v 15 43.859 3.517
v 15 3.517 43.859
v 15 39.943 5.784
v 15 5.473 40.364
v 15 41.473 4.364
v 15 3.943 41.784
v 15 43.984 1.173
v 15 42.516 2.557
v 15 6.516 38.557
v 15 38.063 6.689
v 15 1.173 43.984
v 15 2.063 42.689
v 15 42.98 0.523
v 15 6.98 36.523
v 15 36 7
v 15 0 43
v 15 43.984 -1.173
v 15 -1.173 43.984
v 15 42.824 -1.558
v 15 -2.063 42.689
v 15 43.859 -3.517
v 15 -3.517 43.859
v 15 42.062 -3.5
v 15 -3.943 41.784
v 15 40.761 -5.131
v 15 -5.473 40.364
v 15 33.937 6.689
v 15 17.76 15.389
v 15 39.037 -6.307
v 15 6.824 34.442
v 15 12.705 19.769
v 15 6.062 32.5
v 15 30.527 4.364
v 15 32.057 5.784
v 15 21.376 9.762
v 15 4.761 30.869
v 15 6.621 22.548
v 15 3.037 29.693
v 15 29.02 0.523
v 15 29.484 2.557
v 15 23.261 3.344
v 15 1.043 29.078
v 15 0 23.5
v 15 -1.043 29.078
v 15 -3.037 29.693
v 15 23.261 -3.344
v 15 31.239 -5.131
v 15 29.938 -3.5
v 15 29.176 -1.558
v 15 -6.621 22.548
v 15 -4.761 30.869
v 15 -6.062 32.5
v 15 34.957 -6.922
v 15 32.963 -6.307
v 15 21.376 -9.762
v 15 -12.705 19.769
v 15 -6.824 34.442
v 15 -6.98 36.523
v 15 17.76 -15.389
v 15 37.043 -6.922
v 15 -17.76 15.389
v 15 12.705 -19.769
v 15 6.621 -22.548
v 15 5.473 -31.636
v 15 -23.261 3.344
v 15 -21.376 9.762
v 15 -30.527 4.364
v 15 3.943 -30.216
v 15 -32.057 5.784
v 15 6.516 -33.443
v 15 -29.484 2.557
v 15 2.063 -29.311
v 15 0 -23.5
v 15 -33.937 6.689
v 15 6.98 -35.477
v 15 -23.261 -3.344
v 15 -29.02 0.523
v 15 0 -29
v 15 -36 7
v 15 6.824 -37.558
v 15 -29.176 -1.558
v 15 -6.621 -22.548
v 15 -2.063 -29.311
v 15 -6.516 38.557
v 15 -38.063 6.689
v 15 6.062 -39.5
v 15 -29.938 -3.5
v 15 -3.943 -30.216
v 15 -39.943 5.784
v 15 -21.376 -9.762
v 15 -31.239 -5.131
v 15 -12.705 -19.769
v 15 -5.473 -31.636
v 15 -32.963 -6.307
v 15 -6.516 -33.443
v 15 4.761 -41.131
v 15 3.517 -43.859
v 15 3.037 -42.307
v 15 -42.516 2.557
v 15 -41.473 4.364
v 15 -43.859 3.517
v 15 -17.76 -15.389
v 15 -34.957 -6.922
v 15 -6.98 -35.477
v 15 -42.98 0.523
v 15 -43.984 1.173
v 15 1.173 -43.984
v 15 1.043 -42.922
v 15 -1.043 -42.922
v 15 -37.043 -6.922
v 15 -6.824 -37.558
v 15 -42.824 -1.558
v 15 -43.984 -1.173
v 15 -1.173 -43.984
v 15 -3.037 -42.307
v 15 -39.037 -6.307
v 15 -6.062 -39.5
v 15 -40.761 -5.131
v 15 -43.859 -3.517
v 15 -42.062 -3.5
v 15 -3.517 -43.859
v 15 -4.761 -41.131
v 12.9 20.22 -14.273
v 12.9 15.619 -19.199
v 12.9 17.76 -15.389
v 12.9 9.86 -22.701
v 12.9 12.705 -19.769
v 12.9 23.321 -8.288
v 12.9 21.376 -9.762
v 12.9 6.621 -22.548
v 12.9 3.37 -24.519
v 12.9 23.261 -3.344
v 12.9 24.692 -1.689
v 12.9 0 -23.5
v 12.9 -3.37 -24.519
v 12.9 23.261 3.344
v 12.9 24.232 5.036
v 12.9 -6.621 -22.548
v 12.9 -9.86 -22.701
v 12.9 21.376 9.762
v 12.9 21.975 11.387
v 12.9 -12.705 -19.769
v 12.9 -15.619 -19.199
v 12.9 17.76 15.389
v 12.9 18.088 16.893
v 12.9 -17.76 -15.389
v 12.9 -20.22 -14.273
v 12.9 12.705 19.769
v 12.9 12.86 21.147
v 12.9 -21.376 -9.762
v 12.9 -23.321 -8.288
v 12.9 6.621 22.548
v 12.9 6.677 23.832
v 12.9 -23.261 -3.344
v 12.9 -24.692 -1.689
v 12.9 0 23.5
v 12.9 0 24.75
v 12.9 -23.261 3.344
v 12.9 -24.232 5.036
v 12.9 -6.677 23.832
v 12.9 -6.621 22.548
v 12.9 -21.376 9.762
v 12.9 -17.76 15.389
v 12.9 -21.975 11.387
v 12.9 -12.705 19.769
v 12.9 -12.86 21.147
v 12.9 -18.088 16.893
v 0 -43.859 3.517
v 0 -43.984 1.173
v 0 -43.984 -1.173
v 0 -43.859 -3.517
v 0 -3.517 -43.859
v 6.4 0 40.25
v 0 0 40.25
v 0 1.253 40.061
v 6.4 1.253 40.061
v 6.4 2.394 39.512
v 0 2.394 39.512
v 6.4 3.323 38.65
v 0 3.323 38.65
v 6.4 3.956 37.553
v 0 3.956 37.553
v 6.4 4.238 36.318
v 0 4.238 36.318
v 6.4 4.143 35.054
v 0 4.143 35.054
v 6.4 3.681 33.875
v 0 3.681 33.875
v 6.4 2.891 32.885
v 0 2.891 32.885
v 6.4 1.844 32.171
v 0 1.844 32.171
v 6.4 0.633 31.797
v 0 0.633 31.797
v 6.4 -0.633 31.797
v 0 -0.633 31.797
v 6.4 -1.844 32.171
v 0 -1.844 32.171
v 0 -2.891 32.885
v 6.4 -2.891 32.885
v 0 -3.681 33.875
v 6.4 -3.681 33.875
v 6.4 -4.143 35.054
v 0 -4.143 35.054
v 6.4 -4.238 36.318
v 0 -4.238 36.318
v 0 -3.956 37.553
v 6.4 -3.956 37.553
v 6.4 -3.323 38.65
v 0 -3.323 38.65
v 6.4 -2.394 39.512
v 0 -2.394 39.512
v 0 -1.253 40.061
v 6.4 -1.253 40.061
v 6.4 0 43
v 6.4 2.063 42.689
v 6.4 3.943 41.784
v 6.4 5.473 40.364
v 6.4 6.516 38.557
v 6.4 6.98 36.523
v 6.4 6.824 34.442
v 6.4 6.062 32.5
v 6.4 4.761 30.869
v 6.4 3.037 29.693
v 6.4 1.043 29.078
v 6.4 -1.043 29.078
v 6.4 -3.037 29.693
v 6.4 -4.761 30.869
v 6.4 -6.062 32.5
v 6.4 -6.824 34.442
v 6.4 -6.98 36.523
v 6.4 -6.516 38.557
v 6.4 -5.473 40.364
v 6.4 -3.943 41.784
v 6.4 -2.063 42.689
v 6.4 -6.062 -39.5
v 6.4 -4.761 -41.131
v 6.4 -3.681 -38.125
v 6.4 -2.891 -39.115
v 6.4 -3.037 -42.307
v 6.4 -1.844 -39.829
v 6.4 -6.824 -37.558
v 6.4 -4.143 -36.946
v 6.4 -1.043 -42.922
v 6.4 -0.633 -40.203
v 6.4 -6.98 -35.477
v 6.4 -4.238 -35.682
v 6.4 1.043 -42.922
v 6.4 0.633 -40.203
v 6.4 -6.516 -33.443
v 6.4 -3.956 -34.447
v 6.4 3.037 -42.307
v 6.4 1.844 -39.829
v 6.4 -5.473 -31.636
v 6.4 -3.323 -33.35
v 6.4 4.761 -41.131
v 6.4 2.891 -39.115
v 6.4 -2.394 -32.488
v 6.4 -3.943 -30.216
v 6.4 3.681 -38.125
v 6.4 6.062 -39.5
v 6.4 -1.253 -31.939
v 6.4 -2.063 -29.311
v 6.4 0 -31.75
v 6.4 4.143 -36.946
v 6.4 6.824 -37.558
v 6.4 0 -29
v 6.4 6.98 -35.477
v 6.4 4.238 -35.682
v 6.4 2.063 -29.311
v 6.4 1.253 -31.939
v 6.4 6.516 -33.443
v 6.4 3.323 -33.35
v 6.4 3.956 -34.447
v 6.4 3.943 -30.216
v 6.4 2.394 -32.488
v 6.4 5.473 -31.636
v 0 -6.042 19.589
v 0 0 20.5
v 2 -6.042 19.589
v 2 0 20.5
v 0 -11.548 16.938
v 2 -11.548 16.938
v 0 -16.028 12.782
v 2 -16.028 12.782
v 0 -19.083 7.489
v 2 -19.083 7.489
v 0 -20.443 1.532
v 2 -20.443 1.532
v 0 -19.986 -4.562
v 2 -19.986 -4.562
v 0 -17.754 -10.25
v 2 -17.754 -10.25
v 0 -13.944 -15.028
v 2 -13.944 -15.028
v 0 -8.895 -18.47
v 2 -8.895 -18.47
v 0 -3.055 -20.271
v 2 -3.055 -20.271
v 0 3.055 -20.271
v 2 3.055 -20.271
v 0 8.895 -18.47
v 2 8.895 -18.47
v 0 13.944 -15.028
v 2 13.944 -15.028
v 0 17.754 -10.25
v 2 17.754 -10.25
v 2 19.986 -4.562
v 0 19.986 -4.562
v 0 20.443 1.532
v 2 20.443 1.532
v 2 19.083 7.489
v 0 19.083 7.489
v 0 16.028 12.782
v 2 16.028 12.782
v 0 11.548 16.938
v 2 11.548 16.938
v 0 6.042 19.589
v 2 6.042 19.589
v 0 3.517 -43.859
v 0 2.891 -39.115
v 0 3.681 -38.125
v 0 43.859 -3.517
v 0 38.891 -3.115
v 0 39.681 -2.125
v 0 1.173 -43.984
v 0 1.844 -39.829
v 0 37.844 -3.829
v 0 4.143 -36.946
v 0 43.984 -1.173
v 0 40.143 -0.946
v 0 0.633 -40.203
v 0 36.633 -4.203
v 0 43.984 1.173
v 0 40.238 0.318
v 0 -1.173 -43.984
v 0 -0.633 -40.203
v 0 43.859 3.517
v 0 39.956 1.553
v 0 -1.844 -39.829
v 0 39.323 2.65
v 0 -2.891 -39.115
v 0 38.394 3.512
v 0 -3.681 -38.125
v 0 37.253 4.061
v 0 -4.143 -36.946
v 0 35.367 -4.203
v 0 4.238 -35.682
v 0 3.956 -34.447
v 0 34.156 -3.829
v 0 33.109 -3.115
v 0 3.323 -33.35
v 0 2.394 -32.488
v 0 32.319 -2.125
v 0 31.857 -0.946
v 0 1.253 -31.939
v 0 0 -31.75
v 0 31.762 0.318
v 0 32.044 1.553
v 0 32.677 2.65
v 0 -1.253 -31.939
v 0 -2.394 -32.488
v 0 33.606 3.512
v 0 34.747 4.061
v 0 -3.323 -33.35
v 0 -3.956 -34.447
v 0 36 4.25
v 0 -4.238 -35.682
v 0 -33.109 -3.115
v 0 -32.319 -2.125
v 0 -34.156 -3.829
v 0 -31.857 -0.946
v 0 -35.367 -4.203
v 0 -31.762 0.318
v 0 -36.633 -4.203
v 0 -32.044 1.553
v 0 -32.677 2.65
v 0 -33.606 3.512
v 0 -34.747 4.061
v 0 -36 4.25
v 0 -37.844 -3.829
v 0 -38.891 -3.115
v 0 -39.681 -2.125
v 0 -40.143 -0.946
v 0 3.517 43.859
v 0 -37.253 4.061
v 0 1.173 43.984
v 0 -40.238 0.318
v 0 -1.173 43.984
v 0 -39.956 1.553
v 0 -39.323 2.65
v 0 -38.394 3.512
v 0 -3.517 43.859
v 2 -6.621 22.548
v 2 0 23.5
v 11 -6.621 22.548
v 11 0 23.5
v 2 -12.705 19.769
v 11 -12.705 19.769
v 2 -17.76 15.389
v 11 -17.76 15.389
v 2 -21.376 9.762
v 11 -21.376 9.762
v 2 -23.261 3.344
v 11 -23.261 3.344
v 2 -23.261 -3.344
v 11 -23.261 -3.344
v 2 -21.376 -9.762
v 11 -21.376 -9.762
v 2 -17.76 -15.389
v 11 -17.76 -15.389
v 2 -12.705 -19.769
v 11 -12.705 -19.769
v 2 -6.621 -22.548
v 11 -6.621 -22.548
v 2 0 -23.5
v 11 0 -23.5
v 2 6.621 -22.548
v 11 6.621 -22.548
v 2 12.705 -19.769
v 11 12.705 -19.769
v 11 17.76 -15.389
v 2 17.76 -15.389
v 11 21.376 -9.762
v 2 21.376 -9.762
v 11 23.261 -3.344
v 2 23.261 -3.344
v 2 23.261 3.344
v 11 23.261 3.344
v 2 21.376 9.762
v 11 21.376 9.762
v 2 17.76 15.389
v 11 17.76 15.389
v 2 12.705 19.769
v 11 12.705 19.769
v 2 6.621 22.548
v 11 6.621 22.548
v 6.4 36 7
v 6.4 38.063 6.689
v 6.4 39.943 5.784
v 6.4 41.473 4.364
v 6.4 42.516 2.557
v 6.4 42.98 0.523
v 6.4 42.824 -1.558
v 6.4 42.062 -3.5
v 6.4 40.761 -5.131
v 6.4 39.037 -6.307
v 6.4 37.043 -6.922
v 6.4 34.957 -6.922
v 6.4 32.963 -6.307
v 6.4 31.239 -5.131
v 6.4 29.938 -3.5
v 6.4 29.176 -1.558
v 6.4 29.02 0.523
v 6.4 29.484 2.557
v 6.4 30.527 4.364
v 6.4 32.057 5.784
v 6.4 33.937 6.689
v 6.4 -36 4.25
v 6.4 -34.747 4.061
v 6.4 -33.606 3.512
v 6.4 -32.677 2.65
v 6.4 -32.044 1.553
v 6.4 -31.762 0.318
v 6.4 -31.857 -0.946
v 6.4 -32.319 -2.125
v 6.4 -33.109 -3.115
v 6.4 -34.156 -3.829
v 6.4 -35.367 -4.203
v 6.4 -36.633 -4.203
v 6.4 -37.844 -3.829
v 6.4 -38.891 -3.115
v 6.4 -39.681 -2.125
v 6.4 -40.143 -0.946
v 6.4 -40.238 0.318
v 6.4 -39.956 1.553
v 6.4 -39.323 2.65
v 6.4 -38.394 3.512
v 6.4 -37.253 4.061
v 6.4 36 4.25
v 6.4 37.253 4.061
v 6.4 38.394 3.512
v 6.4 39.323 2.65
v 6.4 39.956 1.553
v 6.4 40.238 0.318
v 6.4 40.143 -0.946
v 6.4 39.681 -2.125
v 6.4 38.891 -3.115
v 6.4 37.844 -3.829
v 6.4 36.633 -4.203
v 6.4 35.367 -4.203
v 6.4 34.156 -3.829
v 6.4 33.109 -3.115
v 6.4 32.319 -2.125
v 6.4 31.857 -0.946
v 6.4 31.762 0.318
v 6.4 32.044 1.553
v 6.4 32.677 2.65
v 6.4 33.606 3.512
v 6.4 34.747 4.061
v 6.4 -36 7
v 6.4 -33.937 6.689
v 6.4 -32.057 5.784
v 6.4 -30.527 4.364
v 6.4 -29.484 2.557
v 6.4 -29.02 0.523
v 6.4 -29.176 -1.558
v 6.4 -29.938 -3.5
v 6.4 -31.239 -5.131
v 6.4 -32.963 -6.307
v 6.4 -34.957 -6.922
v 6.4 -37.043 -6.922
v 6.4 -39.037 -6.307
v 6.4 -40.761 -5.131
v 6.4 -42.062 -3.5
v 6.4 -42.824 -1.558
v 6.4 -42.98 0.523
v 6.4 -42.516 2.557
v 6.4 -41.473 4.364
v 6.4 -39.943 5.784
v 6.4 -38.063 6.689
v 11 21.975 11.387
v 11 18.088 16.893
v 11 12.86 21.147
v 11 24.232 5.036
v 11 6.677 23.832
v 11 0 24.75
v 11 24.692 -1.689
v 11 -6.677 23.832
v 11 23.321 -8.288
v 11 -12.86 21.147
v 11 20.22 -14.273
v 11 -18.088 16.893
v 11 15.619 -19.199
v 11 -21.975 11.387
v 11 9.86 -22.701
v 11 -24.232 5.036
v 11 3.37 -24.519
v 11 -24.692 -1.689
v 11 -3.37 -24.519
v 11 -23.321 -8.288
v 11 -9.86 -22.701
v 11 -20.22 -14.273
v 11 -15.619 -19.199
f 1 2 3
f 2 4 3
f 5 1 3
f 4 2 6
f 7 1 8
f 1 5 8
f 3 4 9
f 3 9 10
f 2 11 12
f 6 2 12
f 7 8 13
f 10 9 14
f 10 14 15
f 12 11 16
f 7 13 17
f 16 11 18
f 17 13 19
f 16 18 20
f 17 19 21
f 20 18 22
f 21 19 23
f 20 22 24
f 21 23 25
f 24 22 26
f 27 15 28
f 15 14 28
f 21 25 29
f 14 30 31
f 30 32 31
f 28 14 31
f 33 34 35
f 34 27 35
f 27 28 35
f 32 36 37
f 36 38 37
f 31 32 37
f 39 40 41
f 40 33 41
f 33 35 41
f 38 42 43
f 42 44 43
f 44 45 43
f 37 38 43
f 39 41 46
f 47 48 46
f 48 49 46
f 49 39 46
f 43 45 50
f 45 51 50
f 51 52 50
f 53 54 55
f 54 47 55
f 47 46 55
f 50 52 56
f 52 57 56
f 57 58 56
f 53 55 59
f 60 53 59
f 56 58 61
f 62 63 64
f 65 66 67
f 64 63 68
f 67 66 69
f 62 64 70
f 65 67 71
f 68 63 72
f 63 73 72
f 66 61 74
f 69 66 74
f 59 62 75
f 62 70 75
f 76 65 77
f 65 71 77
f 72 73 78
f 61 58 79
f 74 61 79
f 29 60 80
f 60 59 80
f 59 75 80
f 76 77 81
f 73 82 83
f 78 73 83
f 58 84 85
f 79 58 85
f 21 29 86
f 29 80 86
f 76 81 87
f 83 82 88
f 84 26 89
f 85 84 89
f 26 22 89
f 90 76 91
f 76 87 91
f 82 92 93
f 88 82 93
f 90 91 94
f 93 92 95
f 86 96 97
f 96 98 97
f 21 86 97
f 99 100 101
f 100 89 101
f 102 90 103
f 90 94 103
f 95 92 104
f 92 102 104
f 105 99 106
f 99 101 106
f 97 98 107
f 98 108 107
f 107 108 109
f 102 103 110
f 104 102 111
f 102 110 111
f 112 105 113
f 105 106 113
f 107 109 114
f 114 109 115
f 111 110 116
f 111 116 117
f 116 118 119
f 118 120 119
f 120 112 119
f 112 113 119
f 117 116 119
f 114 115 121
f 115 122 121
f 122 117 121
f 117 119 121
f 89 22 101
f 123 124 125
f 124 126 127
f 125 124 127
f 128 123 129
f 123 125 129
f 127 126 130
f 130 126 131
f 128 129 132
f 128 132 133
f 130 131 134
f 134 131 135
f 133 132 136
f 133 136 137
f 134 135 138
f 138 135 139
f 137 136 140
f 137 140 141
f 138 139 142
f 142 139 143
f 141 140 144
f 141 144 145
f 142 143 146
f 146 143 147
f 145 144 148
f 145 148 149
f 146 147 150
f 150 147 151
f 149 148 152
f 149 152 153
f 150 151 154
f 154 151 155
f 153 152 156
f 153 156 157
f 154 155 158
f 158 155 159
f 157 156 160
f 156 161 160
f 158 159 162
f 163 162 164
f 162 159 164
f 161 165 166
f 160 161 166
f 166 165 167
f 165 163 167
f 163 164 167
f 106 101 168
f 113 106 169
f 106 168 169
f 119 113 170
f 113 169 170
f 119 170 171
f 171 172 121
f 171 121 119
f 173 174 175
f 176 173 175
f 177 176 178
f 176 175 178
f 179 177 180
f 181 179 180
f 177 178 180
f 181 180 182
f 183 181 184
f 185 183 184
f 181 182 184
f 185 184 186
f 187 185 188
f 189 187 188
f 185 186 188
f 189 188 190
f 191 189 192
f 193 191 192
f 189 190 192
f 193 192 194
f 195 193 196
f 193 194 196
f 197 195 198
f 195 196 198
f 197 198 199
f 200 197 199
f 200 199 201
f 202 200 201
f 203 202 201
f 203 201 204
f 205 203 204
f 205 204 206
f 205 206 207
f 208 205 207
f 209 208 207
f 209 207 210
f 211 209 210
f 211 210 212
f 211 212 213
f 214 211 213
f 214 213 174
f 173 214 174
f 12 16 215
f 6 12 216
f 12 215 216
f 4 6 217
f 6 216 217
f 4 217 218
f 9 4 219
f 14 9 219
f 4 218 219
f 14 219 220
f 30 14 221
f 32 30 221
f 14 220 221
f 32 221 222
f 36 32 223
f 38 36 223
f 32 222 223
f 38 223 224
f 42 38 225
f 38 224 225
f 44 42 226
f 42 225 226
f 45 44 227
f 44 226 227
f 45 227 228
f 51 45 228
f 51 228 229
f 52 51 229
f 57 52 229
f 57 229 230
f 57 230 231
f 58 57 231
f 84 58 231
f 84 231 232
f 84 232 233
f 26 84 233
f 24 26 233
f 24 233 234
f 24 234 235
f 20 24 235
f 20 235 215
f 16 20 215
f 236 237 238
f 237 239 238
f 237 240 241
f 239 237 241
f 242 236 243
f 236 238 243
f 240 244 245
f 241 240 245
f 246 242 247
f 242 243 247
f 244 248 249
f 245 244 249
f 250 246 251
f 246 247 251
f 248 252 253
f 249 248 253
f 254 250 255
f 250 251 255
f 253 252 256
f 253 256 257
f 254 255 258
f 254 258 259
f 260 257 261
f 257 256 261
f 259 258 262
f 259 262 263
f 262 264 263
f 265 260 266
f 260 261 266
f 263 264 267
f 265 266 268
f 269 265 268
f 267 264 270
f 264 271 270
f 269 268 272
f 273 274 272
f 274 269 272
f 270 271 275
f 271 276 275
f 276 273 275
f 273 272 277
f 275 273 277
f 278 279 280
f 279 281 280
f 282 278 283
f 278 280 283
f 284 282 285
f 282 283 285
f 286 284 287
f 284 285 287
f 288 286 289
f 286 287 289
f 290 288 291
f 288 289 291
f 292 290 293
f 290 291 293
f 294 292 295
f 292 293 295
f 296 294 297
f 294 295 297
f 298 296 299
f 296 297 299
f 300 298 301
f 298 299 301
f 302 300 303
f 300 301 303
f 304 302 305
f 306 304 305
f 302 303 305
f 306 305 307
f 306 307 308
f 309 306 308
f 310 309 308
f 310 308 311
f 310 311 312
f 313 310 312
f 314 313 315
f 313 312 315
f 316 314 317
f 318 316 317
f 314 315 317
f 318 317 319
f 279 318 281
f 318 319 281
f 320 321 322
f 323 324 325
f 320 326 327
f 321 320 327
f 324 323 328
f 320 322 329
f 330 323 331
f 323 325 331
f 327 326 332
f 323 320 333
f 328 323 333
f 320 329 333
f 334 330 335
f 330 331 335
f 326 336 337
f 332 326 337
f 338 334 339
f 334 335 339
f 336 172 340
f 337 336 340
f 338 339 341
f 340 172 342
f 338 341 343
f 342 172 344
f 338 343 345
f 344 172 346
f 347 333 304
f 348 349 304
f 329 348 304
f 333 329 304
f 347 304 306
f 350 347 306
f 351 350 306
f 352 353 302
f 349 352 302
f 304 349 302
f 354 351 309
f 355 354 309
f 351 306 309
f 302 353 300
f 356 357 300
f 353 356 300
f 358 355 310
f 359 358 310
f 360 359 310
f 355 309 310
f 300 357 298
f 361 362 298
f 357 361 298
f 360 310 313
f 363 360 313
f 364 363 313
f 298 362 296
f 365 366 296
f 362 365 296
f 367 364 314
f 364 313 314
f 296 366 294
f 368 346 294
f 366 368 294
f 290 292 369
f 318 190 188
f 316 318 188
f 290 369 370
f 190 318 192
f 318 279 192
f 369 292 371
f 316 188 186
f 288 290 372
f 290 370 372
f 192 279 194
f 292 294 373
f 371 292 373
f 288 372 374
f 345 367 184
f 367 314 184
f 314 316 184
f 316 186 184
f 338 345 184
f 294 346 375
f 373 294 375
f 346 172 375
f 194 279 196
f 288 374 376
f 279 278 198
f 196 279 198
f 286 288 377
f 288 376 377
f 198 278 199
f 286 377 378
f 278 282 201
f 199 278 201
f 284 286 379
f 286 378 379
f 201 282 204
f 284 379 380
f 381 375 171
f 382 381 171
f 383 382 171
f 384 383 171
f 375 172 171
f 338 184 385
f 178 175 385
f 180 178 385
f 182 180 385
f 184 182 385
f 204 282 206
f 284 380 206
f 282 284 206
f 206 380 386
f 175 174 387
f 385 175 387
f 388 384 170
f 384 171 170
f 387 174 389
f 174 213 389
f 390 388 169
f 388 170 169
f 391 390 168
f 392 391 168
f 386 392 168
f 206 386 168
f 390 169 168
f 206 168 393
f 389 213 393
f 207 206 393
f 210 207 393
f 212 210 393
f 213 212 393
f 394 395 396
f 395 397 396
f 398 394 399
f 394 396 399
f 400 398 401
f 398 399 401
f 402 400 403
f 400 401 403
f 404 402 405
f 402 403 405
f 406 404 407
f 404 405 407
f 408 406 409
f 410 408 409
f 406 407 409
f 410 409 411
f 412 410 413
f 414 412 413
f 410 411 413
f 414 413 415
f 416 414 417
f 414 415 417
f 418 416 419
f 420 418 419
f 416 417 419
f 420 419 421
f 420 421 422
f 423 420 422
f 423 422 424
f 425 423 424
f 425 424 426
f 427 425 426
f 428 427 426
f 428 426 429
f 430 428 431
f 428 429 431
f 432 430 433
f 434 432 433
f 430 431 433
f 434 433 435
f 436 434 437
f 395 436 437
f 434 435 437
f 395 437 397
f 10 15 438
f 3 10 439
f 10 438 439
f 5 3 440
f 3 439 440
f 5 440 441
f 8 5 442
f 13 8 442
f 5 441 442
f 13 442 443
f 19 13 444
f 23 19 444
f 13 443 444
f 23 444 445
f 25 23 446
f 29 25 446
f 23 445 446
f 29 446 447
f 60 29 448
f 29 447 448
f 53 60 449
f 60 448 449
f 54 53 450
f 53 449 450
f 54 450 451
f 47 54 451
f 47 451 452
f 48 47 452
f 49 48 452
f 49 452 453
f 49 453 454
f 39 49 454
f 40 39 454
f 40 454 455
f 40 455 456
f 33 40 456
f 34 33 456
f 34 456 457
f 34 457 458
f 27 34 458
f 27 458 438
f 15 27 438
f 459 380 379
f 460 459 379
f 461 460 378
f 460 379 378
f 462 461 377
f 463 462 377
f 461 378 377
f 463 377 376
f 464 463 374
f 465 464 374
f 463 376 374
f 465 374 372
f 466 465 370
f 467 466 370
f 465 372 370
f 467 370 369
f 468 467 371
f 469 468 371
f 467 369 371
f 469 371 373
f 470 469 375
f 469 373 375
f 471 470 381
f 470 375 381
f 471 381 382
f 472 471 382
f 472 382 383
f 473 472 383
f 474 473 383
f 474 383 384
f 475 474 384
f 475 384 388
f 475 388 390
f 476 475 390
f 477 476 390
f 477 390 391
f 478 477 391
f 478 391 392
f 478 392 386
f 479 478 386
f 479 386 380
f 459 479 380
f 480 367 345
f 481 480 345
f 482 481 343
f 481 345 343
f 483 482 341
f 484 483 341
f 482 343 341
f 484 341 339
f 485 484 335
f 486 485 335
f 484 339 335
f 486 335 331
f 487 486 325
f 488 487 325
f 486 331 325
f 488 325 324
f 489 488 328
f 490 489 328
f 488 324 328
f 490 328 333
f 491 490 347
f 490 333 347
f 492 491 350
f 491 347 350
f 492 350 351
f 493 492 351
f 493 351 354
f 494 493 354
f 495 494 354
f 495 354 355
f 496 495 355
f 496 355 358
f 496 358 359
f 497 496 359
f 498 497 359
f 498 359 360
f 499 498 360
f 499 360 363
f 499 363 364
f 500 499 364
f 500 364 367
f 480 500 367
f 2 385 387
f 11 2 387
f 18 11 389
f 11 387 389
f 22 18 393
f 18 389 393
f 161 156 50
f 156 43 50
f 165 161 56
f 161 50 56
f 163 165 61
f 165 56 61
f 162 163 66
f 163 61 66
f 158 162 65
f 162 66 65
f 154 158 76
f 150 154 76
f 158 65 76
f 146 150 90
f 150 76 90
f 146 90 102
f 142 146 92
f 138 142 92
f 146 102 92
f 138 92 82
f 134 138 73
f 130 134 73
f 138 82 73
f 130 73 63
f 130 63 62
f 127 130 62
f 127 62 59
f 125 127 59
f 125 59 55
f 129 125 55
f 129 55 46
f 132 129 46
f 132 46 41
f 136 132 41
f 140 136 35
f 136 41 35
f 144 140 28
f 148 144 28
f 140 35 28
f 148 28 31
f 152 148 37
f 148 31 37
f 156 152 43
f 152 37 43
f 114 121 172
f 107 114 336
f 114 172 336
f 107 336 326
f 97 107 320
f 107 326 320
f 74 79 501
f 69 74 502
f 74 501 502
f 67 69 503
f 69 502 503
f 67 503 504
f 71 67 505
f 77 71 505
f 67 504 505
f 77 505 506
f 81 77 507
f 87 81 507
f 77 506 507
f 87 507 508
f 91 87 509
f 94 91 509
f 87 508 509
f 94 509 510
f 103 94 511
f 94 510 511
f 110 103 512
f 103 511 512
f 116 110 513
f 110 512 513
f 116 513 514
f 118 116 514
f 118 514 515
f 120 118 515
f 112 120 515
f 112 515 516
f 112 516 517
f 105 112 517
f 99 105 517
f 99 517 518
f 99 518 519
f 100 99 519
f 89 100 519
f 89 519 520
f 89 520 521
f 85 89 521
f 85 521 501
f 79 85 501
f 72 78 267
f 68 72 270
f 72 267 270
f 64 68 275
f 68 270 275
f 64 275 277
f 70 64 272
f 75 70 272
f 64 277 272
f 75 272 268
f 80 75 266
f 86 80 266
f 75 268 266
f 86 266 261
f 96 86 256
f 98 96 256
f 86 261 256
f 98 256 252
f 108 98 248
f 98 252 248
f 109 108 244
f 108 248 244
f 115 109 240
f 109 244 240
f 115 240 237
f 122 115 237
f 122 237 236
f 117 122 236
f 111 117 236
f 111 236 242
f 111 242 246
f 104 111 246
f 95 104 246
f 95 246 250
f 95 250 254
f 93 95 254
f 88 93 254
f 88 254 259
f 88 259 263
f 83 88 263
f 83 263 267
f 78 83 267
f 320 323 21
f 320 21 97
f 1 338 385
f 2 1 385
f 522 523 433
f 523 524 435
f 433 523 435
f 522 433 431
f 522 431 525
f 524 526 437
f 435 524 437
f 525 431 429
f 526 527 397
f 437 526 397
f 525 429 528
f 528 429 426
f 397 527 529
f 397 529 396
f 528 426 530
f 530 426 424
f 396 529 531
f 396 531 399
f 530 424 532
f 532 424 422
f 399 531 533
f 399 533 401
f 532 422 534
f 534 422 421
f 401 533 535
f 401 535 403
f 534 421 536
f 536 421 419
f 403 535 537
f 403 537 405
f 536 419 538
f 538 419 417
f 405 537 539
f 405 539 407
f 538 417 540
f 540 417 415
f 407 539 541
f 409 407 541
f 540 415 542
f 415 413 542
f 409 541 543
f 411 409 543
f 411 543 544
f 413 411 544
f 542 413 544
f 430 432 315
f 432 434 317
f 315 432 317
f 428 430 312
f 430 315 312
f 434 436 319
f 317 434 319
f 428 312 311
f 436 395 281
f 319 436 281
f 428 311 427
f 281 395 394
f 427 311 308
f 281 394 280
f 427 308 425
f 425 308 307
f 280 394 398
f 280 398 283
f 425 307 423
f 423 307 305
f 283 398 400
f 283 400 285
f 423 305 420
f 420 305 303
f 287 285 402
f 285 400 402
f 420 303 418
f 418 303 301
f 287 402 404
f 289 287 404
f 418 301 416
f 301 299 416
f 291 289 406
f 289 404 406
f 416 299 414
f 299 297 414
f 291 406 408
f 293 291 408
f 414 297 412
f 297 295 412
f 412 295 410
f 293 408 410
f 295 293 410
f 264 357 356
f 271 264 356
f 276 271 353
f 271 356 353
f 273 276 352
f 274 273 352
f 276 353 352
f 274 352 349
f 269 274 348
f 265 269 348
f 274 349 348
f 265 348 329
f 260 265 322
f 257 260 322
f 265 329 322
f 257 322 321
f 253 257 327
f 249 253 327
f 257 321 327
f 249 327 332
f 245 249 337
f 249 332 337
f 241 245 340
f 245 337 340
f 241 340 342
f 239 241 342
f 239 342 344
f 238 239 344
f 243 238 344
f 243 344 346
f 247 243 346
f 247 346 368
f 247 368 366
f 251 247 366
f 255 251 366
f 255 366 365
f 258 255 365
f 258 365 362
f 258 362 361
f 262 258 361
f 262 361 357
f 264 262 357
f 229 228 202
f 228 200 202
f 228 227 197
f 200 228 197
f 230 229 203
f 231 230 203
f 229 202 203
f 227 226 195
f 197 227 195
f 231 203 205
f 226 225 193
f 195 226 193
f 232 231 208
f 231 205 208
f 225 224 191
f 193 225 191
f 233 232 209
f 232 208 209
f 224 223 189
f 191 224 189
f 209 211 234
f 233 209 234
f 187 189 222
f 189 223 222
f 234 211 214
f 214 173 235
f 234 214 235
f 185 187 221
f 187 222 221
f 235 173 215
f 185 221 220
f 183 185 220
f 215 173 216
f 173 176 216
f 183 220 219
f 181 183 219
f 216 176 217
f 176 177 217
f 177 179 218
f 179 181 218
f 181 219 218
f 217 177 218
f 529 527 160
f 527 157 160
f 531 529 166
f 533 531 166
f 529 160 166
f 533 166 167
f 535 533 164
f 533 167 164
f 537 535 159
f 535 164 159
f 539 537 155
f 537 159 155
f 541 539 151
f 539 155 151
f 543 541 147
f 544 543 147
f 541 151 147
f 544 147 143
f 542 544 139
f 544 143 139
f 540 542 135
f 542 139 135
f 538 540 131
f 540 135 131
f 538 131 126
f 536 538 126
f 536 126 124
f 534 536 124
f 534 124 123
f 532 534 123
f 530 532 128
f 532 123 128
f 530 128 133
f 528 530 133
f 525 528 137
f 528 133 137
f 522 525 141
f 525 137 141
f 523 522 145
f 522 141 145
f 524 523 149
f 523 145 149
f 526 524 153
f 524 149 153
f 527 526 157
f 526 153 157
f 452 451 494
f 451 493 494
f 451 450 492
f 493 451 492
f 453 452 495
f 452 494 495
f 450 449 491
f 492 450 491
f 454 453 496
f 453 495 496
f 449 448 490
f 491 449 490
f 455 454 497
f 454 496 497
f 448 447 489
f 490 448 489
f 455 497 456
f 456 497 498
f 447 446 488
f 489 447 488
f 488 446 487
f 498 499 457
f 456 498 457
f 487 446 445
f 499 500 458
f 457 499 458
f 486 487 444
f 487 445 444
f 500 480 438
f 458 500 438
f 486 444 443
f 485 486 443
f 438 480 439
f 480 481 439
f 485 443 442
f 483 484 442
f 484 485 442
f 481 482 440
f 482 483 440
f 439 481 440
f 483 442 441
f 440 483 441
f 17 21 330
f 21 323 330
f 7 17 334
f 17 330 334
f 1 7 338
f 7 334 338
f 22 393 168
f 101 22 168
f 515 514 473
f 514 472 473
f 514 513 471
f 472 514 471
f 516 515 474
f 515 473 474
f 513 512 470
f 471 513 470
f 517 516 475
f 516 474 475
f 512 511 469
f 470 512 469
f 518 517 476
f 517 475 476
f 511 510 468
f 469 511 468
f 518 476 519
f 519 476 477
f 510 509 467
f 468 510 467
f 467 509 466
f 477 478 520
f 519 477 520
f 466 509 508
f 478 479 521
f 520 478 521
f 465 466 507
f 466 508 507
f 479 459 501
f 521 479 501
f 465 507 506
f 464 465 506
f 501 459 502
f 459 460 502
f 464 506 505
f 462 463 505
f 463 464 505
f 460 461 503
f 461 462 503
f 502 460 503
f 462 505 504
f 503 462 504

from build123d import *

# Parameters (mm, degrees)
DIAMETER_HOLE1_D     = 14
DIAMETER_HOLE1_DEPTH = 8.6
TAPPED_HOLE1_D       = 8.5
CUT_EXTRUDE1_DEPTH   = 65.007812023


with BuildPart() as part:
    # Sketch1 → Revolve1 (revolve)
    with BuildSketch(Plane.XY):
        Polygon((15, 44), (0, 44), (0, 20.5), (2, 20.5), (2, 23.5), (11, 23.5), (11, 24.75), (12.9, 24.75), (12.9, 23.5), (15, 23.5), align=None)
    revolve(axis=Axis((0, 0, 0), (1, 0, 0)))

    # Diameter Hole1
    with Locations(Plane(origin=(15, 0, 0), x_dir=(0, 0, -1), z_dir=(1, 0, 0))):
        with Locations((0, 36), (36, 0), (0, -36), (-36, 0)):
            Hole(DIAMETER_HOLE1_D / 2, depth=DIAMETER_HOLE1_DEPTH)

    # Tapped Hole1 (through all)
    with Locations(Plane(origin=(6.4, 0, 0), x_dir=(0, 0, -1), z_dir=(1, 0, 0))):
        with Locations((0, 36), (36, 0), (0, -36), (-36, 0)):
            Hole(TAPPED_HOLE1_D / 2)

    # Sketch6 → Cut-Extrude1 (cut, through all)
    with BuildSketch(Plane(origin=(0, 0, 0), x_dir=(0, 0, -1), z_dir=(1, 0, 0))):
        with BuildLine():
            Line((-3.516934416, 43.859219924), (-43.859219924, 3.516934416))
            ThreePointArc((-43.859219924, 3.516934416), (-31.112698372, 31.112698372), (-3.516934416, 43.859219924))
        make_face()
        with BuildLine():
            Line((3.516934416, 43.859219924), (43.859219924, 3.516934416))
            ThreePointArc((43.859219924, 3.516934416), (31.112698372, 31.112698372), (3.516934416, 43.859219924))
        make_face()
        with BuildLine():
            Line((43.859219924, -3.516934416), (3.516934416, -43.859219924))
            ThreePointArc((3.516934416, -43.859219924), (31.112698372, -31.112698372), (43.859219924, -3.516934416))
        make_face()
        with BuildLine():
            Line((-43.859219924, -3.516934416), (-3.516934416, -43.859219924))
            ThreePointArc((-3.516934416, -43.859219924), (-31.112698372, -31.112698372), (-43.859219924, -3.516934416))
        make_face()
    extrude(amount=CUT_EXTRUDE1_DEPTH, mode=Mode.SUBTRACT)


solid = part.part
